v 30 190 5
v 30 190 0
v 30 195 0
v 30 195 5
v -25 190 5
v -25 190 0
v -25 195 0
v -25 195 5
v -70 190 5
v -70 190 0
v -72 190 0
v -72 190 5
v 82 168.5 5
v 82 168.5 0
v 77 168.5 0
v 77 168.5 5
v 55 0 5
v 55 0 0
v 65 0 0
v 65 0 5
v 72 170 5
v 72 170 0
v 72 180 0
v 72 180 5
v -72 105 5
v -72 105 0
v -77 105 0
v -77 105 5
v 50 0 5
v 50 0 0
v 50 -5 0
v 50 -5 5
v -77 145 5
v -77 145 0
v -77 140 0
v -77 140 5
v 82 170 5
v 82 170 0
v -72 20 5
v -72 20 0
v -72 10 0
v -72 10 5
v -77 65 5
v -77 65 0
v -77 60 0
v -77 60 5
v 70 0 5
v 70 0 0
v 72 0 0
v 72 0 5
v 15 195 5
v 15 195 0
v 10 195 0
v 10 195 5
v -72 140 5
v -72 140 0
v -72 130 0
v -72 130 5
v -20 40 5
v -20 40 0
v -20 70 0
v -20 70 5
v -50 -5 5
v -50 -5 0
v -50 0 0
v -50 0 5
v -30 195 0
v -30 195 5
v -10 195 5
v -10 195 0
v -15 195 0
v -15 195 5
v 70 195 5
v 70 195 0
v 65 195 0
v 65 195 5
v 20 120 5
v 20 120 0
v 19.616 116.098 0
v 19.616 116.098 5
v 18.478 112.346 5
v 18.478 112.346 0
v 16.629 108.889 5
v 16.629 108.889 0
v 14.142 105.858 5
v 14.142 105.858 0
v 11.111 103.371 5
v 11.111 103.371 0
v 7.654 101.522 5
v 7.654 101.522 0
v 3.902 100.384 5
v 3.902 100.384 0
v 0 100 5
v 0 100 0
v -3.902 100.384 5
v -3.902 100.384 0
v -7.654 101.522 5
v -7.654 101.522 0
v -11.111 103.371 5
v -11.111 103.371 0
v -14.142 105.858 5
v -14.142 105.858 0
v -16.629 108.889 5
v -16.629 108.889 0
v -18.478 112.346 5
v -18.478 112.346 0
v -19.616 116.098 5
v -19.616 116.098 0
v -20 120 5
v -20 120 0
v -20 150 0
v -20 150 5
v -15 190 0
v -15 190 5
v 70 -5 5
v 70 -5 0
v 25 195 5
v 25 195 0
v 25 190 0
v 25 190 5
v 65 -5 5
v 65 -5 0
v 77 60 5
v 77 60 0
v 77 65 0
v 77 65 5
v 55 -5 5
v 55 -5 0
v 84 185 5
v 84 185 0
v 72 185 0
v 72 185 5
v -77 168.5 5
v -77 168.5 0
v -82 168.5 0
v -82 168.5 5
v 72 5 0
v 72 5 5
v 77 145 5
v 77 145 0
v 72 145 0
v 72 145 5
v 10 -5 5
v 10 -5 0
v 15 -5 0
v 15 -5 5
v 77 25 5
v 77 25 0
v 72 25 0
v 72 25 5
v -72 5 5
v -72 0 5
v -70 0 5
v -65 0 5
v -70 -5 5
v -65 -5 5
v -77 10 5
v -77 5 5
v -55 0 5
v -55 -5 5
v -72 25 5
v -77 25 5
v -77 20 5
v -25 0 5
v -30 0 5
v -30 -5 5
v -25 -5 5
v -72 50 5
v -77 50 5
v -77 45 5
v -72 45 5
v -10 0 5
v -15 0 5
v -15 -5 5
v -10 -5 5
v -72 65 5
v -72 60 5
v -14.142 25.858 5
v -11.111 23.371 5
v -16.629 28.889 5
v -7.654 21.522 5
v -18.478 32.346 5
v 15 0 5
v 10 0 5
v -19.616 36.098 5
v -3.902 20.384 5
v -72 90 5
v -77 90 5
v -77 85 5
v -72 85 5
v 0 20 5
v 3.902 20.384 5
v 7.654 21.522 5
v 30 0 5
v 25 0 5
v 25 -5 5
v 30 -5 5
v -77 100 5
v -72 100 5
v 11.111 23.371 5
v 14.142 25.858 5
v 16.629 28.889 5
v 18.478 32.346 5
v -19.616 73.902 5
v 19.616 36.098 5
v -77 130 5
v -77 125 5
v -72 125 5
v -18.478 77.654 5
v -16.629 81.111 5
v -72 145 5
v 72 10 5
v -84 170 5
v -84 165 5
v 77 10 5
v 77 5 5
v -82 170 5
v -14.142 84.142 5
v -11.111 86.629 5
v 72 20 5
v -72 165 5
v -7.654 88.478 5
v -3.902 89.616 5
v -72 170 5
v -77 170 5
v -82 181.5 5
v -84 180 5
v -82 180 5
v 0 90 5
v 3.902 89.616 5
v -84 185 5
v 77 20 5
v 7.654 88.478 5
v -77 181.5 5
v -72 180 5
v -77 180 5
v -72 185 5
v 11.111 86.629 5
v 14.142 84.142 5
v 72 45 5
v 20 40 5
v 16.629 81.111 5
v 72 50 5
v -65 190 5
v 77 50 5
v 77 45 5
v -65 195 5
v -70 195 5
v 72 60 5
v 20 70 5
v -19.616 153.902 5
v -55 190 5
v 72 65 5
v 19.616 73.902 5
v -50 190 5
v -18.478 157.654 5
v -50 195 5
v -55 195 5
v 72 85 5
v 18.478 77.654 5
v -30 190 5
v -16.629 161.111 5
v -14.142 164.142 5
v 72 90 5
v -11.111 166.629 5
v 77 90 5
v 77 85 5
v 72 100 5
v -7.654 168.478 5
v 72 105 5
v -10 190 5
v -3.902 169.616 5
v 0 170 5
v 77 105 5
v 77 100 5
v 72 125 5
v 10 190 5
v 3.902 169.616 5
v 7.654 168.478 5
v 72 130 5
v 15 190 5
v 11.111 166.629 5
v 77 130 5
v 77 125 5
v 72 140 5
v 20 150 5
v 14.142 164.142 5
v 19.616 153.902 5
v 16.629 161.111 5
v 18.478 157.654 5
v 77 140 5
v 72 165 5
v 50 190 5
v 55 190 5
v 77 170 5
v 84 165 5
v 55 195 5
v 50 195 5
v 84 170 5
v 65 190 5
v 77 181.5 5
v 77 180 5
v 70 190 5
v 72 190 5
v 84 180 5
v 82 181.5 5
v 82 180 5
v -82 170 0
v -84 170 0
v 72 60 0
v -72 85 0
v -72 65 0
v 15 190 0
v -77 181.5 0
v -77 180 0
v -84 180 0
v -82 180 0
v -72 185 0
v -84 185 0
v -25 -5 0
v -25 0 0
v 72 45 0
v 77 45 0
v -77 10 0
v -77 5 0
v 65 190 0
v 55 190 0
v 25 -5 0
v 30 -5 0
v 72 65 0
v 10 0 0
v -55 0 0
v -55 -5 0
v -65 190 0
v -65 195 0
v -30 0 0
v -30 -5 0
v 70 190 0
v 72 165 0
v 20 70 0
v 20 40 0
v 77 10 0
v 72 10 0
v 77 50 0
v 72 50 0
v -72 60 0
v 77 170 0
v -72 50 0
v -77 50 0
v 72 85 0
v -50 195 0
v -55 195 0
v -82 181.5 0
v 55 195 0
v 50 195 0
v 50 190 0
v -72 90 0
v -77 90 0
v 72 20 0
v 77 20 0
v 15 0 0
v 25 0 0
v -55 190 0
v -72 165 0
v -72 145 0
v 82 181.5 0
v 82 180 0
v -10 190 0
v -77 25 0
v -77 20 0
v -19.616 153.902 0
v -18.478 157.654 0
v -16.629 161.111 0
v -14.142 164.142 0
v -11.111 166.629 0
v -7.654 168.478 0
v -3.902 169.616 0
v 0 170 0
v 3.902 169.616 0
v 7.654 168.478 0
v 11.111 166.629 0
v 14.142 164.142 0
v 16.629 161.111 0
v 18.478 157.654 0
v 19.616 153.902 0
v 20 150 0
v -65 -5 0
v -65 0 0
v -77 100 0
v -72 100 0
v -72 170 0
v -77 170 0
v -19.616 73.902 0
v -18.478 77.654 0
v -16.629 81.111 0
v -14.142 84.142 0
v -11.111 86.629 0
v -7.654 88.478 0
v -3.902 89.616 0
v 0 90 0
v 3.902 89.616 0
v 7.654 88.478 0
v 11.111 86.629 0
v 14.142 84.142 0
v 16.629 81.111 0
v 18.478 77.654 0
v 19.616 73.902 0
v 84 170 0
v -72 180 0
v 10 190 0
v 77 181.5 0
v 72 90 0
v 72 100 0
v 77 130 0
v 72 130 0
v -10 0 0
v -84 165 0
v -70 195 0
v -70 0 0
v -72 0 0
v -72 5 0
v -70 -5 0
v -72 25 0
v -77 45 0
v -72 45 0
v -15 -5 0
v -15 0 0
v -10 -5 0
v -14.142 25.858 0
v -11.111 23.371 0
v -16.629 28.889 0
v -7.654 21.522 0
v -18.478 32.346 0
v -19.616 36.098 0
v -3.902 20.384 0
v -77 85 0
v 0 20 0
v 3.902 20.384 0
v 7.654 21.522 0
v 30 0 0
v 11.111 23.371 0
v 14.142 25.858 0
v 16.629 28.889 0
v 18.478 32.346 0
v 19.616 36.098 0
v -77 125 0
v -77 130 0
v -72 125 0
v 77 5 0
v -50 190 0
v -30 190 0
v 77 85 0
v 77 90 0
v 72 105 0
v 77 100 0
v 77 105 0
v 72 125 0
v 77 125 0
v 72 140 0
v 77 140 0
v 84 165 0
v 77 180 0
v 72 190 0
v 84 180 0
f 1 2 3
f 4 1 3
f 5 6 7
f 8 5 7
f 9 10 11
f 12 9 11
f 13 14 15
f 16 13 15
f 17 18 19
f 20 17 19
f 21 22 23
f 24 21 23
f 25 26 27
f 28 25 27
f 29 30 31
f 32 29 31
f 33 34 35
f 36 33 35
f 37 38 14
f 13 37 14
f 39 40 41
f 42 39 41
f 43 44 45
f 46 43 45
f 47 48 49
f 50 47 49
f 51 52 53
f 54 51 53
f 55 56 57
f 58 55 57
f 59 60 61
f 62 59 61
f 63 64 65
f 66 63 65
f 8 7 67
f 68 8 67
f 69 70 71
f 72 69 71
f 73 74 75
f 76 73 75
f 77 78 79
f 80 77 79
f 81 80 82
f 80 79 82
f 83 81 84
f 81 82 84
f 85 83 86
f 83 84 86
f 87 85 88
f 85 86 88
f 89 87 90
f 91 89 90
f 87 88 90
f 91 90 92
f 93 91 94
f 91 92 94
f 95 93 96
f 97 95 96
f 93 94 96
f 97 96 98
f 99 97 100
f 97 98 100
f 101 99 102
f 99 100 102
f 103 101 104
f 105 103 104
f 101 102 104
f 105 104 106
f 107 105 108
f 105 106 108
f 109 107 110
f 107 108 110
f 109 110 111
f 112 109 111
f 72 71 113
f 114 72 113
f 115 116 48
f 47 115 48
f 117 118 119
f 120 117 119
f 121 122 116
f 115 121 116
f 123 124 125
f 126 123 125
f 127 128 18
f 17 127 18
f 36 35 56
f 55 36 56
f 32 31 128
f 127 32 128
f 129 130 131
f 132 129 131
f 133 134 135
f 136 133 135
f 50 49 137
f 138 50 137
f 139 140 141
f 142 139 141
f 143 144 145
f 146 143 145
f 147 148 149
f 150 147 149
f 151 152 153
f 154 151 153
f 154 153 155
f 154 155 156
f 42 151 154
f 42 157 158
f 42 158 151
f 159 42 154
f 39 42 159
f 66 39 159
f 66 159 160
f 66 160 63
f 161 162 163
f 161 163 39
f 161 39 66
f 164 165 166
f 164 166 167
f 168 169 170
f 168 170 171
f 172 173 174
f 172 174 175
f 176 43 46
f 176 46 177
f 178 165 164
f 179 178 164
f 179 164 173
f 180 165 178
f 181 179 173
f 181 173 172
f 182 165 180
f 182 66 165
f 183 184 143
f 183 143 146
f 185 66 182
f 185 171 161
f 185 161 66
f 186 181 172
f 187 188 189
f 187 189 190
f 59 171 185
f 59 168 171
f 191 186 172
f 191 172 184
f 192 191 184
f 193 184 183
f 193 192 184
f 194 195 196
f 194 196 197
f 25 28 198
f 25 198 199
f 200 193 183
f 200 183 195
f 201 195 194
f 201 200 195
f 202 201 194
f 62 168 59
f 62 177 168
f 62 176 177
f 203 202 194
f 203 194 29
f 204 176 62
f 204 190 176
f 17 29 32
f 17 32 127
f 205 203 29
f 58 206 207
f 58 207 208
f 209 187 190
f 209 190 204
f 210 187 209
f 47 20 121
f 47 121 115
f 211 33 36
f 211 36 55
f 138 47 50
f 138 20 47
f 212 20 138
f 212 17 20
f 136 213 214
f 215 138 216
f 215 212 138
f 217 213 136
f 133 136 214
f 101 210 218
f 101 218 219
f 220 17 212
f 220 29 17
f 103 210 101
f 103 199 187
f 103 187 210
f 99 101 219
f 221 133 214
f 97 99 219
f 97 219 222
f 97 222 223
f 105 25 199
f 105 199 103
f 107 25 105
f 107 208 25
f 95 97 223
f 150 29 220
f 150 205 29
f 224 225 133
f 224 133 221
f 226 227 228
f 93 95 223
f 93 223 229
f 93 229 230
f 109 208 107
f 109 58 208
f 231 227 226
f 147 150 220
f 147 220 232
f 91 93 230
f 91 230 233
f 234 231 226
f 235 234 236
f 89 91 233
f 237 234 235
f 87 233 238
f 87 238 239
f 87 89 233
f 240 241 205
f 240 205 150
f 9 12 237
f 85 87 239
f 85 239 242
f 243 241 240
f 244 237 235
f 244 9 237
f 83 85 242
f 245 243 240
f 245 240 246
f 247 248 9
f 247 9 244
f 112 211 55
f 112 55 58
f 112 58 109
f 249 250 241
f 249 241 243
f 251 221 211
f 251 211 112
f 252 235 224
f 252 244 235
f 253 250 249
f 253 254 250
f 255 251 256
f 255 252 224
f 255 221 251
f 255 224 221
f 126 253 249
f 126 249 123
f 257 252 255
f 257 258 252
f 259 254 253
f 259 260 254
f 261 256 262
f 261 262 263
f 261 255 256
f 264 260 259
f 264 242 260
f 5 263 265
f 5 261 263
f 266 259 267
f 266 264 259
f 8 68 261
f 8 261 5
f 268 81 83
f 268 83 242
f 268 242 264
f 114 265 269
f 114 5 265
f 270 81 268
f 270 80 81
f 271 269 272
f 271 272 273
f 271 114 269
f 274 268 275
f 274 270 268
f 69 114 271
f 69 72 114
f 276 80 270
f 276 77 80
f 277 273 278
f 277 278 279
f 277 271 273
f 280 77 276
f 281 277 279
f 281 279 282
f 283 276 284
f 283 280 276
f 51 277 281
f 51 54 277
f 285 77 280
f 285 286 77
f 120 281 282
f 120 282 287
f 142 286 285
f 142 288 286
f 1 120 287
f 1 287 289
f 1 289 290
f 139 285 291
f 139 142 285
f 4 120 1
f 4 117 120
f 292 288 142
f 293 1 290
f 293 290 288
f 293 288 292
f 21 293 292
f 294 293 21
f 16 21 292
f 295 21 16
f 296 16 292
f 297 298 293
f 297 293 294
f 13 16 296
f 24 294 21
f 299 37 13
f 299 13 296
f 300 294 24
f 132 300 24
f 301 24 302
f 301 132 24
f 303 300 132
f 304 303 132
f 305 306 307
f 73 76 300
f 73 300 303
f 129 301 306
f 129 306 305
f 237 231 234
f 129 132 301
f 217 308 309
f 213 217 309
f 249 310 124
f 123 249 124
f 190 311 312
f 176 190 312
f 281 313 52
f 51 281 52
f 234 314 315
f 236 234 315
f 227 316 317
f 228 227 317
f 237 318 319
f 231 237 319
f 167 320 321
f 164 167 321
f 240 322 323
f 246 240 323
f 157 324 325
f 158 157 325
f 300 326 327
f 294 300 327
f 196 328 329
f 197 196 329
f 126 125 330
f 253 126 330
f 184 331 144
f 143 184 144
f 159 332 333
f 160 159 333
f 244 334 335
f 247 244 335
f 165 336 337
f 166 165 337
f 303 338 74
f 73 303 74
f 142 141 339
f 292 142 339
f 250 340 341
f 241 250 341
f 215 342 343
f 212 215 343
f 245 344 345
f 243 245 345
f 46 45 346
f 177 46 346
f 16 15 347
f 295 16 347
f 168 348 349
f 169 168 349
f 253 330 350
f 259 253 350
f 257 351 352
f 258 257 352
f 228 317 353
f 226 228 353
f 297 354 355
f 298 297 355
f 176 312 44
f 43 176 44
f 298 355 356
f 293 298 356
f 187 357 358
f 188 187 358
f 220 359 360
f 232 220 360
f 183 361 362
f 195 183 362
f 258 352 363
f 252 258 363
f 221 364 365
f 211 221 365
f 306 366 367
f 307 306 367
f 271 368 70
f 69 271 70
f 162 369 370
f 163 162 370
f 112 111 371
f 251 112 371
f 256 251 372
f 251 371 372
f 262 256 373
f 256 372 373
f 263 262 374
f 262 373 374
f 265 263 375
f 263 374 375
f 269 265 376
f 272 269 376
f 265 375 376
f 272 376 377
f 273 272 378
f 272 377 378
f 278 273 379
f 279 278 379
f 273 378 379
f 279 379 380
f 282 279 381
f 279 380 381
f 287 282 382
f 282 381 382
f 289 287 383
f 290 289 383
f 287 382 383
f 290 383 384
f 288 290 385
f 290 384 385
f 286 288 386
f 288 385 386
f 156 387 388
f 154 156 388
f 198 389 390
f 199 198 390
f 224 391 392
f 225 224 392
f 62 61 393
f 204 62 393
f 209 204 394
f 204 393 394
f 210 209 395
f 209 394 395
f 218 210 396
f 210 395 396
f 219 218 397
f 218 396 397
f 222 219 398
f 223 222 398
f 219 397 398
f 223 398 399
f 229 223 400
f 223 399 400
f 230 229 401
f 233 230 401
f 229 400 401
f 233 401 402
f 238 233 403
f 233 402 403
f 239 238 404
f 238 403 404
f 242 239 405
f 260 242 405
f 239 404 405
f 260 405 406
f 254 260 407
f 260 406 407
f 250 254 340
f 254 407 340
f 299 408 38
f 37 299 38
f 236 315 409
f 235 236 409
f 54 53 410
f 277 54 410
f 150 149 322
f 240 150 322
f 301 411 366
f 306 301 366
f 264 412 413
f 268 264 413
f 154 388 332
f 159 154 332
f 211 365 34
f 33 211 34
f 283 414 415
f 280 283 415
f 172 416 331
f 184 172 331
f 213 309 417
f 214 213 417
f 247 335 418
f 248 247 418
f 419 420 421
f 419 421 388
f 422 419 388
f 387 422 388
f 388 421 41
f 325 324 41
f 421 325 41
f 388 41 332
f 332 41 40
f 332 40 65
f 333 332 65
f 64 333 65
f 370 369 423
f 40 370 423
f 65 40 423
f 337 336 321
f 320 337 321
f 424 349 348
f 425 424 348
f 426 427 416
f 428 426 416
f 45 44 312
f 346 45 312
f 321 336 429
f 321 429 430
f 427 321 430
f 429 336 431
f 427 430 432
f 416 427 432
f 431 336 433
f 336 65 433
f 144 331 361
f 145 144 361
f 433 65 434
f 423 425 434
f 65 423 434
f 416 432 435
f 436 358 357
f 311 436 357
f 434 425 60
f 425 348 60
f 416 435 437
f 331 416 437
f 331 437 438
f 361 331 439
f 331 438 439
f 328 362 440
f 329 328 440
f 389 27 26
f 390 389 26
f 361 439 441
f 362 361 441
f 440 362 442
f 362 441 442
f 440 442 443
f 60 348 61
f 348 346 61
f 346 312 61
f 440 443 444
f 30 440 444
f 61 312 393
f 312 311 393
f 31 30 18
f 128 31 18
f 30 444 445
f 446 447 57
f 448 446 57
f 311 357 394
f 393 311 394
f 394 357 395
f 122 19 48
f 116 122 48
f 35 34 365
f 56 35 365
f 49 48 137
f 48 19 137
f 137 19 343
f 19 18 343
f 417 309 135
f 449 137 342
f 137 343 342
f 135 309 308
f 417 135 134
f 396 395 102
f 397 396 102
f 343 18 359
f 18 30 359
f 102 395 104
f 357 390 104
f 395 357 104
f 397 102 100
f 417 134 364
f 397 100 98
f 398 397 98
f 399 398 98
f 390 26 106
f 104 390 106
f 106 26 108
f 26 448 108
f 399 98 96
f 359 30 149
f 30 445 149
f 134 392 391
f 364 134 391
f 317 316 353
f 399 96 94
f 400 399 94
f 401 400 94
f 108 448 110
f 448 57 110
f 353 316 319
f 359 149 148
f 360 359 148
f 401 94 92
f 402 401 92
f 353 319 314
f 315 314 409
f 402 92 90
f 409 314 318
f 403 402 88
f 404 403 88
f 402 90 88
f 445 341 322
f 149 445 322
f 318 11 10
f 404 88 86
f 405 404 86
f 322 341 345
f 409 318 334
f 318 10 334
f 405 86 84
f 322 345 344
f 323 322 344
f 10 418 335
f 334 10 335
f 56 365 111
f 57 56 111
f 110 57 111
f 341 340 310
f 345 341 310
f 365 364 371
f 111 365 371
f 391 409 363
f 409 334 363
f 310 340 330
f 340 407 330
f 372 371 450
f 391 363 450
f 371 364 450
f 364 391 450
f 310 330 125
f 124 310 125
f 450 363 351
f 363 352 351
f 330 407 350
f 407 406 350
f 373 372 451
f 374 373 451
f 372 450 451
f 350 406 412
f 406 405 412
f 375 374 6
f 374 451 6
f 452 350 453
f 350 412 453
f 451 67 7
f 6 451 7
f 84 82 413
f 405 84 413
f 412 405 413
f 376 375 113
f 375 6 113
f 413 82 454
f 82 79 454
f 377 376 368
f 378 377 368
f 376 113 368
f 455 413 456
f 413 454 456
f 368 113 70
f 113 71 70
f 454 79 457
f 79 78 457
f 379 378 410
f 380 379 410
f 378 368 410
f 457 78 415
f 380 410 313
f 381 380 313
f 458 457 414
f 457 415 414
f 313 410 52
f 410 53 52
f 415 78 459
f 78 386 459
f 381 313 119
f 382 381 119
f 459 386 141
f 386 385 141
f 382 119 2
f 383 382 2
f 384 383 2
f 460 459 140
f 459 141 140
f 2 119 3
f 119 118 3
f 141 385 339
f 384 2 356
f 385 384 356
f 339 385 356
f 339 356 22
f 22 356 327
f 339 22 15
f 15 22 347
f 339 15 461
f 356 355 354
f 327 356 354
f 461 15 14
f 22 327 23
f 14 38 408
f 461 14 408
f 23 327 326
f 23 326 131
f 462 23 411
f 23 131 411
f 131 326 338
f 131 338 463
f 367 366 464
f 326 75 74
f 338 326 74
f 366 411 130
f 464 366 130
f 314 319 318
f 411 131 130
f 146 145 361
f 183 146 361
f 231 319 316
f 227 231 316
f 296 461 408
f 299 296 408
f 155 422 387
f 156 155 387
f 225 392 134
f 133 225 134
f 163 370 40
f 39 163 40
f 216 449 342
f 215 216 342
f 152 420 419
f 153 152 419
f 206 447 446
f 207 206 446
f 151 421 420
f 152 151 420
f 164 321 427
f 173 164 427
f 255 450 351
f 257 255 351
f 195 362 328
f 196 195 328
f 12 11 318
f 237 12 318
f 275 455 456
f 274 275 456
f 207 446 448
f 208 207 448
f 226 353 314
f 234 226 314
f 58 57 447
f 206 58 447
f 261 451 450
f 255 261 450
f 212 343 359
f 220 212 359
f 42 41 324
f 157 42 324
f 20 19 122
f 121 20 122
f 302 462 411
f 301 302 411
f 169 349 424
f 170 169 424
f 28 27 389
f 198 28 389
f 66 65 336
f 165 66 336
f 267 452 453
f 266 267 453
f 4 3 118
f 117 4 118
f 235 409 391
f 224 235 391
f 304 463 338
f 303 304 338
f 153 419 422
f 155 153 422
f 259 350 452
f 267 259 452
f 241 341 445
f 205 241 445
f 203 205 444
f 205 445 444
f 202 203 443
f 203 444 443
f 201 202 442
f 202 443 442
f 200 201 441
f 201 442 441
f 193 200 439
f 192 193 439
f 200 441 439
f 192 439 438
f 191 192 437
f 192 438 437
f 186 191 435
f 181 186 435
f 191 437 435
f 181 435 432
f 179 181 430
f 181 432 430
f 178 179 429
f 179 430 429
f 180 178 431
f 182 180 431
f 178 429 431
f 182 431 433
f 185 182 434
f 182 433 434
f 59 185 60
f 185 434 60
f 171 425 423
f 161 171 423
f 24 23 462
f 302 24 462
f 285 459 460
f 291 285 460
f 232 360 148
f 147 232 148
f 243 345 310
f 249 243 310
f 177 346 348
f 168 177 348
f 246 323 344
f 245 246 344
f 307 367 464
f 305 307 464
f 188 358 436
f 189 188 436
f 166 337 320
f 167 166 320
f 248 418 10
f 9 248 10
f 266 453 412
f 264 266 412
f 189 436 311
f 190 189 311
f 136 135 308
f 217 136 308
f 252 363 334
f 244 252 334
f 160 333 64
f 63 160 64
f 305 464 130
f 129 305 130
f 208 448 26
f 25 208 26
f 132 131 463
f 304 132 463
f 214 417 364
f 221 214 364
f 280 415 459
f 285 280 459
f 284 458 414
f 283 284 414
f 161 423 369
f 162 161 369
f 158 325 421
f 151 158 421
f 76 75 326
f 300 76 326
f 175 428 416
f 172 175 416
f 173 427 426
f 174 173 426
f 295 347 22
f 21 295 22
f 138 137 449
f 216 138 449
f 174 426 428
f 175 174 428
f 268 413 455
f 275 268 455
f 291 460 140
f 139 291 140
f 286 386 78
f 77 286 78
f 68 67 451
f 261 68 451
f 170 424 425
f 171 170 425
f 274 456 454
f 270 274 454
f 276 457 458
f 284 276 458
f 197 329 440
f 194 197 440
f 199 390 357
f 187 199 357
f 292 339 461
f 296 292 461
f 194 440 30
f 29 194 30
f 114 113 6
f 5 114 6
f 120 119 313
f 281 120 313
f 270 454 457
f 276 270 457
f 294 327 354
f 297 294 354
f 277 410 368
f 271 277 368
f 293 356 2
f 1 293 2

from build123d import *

# Parameters (mm, degrees)
BOSS_EXTRU_1_DEPTH = 5


with BuildPart() as part:
    # Esquisse1 → Boss.-Extru.1 (new body)
    with BuildSketch(Plane.XY):
        Polygon((-70, 190), (-72, 190), (-72, 185), (-84, 185), (-84, 180), (-82, 180), (-82, 181.5), (-77, 181.5), (-77, 180), (-72, 180), (-72, 170), (-77, 170), (-77, 168.5), (-82, 168.5), (-82, 170), (-84, 170), (-84, 165), (-72, 165), (-72, 145), (-77, 145), (-77, 140), (-72, 140), (-72, 130), (-77, 130), (-77, 125), (-72, 125), (-72, 105), (-77, 105), (-77, 100), (-72, 100), (-72, 90), (-77, 90), (-77, 85), (-72, 85), (-72, 65), (-77, 65), (-77, 60), (-72, 60), (-72, 50), (-77, 50), (-77, 45), (-72, 45), (-72, 25), (-77, 25), (-77, 20), (-72, 20), (-72, 10), (-77, 10), (-77, 5), (-72, 5), (-72, 0), (-70, 0), (-70, -5), (-65, -5), (-65, 0), (-55, 0), (-55, -5), (-50, -5), (-50, 0), (-30, 0), (-30, -5), (-25, -5), (-25, 0), (-15, 0), (-15, -5), (-10, -5), (-10, 0), (10, 0), (10, -5), (15, -5), (15, 0), (25, 0), (25, -5), (30, -5), (30, 0), (50, 0), (50, -5), (55, -5), (55, 0), (65, 0), (65, -5), (70, -5), (70, 0), (72, 0), (72, 5), (77, 5), (77, 10), (72, 10), (72, 20), (77, 20), (77, 25), (72, 25), (72, 45), (77, 45), (77, 50), (72, 50), (72, 60), (77, 60), (77, 65), (72, 65), (72, 85), (77, 85), (77, 90), (72, 90), (72, 100), (77, 100), (77, 105), (72, 105), (72, 125), (77, 125), (77, 130), (72, 130), (72, 140), (77, 140), (77, 145), (72, 145), (72, 165), (84, 165), (84, 170), (82, 170), (82, 168.5), (77, 168.5), (77, 170), (72, 170), (72, 180), (77, 180), (77, 181.5), (82, 181.5), (82, 180), (84, 180), (84, 185), (72, 185), (72, 190), (70, 190), (70, 195), (65, 195), (65, 190), (55, 190), (55, 195), (50, 195), (50, 190), (30, 190), (30, 195), (25, 195), (25, 190), (15, 190), (15, 195), (10, 195), (10, 190), (-10, 190), (-10, 195), (-15, 195), (-15, 190), (-25, 190), (-25, 195), (-30, 195), (-30, 190), (-50, 190), (-50, 195), (-55, 195), (-55, 190), (-65, 190), (-65, 195), (-70, 195), align=None)
        with BuildLine():
            ThreePointArc((20, 40), (0, 20), (-20, 40))
            Line((-20, 40), (-20, 70))
            ThreePointArc((-20, 70), (0, 90), (20, 70))
            Line((20, 70), (20, 40))
        make_face(mode=Mode.SUBTRACT)
        with BuildLine():
            ThreePointArc((20, 120), (0, 100), (-20, 120))
            Line((-20, 120), (-20, 150))
            ThreePointArc((-20, 150), (0, 170), (20, 150))
            Line((20, 150), (20, 120))
        make_face(mode=Mode.SUBTRACT)
    extrude(amount=BOSS_EXTRU_1_DEPTH)


solid = part.part
